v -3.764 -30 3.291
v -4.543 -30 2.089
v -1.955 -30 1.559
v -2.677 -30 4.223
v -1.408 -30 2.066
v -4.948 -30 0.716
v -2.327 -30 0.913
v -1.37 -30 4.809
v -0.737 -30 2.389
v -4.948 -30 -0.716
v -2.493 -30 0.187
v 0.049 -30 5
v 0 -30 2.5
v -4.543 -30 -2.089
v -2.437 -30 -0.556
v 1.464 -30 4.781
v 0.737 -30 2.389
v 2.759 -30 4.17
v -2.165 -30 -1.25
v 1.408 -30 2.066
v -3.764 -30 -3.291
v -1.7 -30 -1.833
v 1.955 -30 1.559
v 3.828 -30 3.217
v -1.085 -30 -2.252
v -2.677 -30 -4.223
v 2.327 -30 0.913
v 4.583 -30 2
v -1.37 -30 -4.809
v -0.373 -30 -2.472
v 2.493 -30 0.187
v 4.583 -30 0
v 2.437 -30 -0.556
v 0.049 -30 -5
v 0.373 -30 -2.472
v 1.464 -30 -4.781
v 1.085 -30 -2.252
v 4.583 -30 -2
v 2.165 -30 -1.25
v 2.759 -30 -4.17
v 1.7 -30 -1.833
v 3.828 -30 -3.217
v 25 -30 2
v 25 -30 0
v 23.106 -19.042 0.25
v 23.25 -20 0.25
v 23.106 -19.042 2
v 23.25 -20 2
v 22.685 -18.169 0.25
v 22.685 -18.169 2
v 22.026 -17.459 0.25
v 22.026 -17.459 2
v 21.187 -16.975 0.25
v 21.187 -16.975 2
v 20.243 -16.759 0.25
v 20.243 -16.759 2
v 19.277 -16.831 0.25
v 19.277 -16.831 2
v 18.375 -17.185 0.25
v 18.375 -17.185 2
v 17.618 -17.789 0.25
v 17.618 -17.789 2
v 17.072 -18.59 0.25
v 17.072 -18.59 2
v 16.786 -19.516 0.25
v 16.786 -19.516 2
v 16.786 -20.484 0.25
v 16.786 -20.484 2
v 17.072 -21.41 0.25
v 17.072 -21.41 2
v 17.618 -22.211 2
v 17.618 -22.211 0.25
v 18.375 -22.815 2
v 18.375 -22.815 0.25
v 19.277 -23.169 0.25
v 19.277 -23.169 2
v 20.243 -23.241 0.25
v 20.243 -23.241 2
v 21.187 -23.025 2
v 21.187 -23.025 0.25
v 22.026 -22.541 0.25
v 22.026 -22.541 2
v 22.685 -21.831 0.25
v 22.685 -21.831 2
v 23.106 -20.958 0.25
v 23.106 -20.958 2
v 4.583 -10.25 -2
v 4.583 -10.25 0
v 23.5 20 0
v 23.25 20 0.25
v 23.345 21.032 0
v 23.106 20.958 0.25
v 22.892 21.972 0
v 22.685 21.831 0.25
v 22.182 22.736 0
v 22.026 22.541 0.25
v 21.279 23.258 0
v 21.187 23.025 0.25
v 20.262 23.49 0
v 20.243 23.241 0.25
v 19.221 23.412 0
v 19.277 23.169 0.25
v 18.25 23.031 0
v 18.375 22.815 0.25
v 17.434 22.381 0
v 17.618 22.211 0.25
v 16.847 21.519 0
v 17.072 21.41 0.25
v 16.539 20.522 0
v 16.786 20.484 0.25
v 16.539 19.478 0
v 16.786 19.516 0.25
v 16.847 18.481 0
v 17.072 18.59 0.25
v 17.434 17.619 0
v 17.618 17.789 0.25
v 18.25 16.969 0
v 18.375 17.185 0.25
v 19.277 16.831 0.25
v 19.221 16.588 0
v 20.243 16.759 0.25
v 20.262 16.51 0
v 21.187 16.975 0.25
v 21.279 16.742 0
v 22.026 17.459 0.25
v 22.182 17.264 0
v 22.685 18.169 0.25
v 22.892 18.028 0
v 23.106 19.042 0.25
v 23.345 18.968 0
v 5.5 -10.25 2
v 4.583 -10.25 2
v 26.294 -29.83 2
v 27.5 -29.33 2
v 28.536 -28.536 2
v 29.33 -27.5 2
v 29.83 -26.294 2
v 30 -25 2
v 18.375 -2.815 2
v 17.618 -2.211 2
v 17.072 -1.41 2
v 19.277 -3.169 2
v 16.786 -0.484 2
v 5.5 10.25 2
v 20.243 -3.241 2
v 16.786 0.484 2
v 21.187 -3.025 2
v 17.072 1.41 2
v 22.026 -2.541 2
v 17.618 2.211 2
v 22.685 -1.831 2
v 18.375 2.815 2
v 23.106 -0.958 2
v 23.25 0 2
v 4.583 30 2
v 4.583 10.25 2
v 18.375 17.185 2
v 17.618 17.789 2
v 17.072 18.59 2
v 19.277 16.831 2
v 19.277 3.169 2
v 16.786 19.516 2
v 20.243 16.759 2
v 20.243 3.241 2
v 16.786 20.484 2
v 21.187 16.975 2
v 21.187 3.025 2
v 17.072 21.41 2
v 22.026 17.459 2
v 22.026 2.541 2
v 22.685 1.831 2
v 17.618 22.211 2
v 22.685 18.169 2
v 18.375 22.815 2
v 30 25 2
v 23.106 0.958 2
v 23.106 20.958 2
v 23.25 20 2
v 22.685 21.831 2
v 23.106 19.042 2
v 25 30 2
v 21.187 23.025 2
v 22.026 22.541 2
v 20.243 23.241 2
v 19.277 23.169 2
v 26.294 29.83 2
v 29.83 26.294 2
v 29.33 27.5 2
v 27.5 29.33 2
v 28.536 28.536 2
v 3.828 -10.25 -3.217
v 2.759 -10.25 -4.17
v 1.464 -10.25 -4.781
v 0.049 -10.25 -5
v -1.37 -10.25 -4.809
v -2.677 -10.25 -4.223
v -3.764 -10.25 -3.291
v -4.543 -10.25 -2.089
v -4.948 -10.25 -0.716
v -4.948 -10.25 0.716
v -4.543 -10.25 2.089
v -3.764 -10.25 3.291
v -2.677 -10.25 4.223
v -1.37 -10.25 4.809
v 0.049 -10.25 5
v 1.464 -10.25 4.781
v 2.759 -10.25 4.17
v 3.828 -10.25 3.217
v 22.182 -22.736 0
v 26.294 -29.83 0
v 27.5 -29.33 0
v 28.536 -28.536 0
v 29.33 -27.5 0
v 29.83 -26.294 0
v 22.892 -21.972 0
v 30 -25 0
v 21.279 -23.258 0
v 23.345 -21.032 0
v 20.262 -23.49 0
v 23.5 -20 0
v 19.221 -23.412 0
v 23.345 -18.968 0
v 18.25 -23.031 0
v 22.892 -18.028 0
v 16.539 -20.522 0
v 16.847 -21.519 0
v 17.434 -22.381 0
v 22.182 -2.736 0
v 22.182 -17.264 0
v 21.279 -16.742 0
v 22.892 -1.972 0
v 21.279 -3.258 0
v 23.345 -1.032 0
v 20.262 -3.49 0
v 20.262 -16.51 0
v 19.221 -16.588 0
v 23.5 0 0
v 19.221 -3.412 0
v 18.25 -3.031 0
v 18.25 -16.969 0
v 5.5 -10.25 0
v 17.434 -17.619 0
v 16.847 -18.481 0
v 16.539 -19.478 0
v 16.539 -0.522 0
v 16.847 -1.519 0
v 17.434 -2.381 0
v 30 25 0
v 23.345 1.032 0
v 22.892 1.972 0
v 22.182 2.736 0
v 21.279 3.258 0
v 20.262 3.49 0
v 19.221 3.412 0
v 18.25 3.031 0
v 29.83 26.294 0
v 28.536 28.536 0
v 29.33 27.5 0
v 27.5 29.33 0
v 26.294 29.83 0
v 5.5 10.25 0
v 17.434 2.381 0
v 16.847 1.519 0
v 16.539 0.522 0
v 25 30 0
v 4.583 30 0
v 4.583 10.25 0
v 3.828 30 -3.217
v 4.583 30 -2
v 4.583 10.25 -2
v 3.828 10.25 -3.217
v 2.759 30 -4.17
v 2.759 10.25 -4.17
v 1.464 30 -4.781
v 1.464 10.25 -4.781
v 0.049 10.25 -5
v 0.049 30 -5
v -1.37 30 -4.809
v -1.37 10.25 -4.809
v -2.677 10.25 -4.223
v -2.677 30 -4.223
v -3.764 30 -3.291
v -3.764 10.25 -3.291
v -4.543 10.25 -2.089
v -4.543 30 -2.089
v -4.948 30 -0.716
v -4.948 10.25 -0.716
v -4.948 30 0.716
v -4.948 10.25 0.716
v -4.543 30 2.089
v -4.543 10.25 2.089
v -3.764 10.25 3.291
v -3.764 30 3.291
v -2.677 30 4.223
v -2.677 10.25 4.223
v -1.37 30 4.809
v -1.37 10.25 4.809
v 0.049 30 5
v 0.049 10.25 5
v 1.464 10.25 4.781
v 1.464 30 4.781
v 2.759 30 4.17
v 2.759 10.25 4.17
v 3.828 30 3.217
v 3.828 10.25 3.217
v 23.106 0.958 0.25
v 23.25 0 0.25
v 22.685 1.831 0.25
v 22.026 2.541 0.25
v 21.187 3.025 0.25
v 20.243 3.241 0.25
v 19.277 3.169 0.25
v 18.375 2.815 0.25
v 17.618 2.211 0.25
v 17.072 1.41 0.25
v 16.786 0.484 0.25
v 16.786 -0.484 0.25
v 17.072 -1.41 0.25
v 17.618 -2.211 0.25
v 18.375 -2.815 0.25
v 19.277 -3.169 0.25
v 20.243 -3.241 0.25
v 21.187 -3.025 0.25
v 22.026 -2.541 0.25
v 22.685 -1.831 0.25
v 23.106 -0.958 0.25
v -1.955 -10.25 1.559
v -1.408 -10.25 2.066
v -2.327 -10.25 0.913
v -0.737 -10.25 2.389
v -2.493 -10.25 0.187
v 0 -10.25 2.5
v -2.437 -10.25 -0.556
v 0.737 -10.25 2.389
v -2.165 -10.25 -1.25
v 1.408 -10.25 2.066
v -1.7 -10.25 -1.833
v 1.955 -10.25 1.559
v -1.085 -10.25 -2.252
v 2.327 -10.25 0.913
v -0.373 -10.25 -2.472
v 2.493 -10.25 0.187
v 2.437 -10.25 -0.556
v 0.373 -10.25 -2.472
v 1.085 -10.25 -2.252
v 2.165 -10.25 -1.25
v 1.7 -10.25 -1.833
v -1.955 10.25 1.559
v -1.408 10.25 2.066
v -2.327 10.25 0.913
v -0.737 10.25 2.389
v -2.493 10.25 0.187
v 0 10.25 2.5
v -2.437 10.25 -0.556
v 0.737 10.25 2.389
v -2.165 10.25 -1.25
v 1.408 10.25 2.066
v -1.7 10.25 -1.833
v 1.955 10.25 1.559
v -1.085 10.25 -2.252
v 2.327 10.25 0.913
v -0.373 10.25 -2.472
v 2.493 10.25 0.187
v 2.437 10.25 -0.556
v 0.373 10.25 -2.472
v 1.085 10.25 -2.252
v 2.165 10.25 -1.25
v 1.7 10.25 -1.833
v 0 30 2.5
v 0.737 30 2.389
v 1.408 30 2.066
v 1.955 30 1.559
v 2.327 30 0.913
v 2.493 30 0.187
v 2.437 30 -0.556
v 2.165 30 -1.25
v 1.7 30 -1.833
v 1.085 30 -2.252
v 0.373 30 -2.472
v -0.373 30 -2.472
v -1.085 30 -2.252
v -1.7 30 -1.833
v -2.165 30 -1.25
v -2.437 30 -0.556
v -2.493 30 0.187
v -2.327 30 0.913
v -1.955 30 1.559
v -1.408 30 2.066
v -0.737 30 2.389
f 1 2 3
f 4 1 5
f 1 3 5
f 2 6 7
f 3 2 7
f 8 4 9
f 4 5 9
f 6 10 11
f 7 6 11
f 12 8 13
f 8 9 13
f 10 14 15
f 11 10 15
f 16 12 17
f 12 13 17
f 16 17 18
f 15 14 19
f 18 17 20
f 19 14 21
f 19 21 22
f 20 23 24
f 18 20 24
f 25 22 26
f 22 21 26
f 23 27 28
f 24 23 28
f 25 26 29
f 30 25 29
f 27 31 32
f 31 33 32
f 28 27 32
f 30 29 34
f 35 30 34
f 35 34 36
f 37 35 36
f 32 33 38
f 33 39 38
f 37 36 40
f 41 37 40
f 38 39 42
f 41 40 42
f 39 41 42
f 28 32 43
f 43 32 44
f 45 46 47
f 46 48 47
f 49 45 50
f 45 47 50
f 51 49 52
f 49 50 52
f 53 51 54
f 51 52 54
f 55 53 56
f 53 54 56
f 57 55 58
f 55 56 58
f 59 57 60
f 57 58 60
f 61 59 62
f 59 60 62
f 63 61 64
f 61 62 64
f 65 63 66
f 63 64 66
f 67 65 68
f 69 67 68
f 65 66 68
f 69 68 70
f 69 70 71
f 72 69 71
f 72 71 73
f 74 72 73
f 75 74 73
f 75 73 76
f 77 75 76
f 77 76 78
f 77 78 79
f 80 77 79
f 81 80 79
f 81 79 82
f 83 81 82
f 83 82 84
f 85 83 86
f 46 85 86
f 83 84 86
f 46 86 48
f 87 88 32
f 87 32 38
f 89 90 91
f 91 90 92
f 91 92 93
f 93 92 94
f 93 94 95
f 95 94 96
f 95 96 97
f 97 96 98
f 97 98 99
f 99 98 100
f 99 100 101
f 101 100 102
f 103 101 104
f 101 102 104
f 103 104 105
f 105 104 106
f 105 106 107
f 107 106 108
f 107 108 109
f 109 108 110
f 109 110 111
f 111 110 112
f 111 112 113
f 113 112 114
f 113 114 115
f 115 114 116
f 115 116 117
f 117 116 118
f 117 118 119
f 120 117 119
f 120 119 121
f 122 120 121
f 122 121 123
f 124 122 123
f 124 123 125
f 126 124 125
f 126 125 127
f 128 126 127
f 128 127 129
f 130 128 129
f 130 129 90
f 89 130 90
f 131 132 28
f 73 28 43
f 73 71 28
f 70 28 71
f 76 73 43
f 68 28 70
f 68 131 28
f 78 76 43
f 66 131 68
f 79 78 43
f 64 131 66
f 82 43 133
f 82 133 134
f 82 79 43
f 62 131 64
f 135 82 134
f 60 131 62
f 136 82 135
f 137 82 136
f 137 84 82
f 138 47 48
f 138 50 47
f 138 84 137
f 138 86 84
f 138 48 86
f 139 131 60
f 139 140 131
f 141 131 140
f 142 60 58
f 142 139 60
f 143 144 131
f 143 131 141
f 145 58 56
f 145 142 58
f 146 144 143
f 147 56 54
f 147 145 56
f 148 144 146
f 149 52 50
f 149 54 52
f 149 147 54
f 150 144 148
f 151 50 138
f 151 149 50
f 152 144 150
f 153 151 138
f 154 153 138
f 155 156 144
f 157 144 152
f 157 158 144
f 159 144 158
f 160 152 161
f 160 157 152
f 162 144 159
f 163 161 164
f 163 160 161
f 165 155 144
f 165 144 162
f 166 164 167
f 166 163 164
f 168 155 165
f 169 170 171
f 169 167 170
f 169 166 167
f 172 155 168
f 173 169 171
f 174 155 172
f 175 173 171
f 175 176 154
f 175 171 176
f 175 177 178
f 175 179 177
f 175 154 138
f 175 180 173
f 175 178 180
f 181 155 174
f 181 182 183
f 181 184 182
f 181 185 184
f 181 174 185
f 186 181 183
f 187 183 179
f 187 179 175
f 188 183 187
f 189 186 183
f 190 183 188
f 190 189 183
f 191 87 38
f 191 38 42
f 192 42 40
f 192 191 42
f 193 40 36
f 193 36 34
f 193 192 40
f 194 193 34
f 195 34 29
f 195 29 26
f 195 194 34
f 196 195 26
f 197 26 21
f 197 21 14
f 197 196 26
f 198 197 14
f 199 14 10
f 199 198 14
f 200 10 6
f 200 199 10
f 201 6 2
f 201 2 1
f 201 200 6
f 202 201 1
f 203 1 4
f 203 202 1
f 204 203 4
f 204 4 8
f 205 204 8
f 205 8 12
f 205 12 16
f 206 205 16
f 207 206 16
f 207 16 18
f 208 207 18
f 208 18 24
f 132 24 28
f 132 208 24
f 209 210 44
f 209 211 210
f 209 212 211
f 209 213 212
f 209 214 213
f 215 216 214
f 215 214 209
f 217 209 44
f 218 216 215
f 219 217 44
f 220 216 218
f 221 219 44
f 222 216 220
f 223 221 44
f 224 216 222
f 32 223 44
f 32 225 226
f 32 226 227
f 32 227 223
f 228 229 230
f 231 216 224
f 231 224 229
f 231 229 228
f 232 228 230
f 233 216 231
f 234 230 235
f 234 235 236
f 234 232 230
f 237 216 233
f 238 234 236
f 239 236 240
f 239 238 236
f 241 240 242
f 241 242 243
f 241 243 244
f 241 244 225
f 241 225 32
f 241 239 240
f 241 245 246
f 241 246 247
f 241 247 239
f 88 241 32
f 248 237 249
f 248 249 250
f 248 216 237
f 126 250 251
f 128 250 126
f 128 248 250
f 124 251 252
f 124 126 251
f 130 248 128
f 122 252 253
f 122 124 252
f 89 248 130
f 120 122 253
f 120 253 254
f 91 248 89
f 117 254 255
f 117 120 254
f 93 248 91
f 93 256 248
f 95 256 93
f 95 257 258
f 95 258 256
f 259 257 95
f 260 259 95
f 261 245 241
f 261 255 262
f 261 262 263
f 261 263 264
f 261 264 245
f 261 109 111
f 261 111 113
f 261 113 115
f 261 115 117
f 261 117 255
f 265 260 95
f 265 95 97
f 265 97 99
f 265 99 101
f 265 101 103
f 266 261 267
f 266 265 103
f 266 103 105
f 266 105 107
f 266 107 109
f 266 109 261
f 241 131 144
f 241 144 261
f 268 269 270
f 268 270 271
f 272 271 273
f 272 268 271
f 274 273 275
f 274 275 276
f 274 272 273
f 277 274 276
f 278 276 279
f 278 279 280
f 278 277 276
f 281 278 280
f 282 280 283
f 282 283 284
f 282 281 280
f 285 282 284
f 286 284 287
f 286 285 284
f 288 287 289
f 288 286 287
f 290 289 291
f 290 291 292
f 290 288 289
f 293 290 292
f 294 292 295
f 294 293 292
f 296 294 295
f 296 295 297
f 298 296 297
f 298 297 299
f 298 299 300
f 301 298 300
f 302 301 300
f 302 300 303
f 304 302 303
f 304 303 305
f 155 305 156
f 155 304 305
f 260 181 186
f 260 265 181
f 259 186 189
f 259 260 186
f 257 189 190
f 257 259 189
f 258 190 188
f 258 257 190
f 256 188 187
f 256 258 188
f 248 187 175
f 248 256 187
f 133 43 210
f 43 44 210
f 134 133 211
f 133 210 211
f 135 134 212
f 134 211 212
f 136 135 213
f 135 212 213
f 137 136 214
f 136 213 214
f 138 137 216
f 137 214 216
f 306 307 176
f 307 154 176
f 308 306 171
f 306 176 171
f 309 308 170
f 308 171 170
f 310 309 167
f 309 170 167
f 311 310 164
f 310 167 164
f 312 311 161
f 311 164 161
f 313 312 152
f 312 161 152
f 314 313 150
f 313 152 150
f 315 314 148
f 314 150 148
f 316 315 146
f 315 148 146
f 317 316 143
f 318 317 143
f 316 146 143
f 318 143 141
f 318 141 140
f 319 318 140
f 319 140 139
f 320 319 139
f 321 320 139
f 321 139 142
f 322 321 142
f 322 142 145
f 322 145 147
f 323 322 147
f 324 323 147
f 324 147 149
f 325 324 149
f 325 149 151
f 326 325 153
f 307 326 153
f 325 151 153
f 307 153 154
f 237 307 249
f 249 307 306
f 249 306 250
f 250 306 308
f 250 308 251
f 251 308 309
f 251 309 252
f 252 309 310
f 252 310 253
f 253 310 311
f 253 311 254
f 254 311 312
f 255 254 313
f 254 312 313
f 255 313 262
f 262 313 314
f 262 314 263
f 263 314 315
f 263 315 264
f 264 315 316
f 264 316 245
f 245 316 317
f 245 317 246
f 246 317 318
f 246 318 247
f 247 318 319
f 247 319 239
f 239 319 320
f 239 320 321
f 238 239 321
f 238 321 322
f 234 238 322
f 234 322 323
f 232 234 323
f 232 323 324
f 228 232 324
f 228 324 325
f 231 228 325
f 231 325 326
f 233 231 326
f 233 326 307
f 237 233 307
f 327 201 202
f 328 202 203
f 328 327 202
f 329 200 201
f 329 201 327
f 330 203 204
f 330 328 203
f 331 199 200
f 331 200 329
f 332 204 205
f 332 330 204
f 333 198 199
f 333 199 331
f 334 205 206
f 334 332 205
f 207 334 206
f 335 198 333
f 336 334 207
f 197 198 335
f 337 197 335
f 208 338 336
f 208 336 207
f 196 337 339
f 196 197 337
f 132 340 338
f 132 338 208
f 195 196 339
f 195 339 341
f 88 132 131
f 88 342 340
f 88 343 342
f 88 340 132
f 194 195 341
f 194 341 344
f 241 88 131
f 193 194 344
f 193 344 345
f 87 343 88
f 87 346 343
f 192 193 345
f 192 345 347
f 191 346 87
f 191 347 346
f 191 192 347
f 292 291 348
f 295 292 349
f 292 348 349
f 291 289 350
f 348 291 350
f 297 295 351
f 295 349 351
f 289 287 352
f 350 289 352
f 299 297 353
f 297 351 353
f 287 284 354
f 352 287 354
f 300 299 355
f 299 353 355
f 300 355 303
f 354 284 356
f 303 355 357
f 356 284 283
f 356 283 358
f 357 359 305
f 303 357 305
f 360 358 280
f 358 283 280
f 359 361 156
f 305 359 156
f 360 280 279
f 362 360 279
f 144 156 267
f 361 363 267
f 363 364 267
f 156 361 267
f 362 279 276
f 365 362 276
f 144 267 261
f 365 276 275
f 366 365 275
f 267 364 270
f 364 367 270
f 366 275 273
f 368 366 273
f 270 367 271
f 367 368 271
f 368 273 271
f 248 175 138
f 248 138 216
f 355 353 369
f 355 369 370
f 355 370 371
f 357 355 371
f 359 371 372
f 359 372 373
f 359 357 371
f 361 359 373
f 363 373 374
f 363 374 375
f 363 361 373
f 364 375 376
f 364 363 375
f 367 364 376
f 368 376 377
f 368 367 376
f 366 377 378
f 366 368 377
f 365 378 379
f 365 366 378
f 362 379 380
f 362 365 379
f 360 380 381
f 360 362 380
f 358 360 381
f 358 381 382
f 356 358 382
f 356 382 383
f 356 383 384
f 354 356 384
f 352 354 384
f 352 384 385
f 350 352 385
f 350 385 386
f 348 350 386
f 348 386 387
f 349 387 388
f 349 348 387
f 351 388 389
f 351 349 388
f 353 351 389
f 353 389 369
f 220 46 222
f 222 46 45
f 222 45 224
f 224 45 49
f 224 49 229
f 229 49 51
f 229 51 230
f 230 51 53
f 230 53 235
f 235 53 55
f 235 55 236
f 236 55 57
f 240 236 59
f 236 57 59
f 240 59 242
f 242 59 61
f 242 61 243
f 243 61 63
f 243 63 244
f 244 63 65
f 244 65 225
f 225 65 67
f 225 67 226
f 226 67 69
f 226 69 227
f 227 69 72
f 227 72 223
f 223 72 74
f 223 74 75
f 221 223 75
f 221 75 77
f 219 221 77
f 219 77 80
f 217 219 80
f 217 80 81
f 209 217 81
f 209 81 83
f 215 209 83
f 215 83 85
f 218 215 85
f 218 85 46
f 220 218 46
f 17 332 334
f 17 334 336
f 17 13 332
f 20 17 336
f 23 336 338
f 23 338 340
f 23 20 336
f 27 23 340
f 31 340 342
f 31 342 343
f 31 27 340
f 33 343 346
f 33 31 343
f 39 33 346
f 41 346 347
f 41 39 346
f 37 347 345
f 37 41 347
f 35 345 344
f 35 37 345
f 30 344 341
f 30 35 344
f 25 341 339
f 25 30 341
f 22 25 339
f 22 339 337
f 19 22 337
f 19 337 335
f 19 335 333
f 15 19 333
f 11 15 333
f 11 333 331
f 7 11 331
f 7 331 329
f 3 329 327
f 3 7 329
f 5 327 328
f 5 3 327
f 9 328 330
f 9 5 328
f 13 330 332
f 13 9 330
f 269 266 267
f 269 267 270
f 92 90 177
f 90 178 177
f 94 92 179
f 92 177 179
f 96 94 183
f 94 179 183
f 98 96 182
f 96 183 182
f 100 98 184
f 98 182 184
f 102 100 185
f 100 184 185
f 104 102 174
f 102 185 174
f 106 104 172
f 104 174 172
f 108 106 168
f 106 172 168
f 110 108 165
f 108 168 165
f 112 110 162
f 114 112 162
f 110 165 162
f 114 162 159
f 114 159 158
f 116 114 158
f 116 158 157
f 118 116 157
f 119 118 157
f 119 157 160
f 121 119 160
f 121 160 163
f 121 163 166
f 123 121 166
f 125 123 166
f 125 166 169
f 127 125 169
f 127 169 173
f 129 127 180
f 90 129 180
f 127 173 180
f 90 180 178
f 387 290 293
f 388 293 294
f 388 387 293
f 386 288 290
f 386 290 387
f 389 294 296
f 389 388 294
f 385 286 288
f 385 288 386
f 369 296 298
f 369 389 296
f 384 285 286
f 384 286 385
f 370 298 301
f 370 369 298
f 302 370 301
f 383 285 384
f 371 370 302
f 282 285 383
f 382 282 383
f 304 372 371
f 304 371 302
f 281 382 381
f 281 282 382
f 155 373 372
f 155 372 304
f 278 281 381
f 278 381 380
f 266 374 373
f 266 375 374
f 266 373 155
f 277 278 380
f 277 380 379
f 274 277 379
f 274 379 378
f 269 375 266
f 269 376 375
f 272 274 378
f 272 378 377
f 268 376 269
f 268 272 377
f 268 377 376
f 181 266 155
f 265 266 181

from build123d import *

# Parameters (mm, degrees)
SKETCH1_R                            = 2.5
BOSS_EXTRUDE1_DEPTH                  = 30
SKETCH1_3_R                          = 2.5
CUT_EXTRUDE1_DEPTH                   = 10.25
F_6_5_6_5_DIAMETER_HOLE1_D           = 6.5
F_6_5_6_5_DIAMETER_HOLE1_CSINK_D     = 7
F_6_5_6_5_DIAMETER_HOLE1_CSINK_ANGLE = 90
FILLET1_R                            = 5


with BuildPart() as part:
    # Sketch1 → Boss-Extrude1 (new, symmetric)
    with BuildSketch(Plane(origin=(0, 0, 0), x_dir=(1, 0, 0), z_dir=(0, 1, 0))):
        with BuildLine():
            Line((4.582575695, 0), (4.582575695, 2))
            ThreePointArc((4.582575695, 2), (-5, 0), (4.582575695, -2))
            Line((4.582575695, -2), (30, -2))
            Line((30, -2), (30, 0))
            Line((30, 0), (4.582575695, 0))
        make_face()
        Circle(SKETCH1_R, mode=Mode.SUBTRACT)
    extrude(amount=BOSS_EXTRUDE1_DEPTH, both=True)

    # Sketch1<3> → Cut-Extrude1 (cut, symmetric)
    with BuildSketch(Plane(origin=(0, 0, 0), x_dir=(1, 0, 0), z_dir=(0, 1, 0))):
        with BuildLine():
            Line((4.582575695, -2), (5.5, -2))
            Line((5.5, -2), (5.5, 0))
            Line((5.5, 0), (4.582575695, 0))
            Line((4.582575695, 0), (4.582575695, 2))
            ThreePointArc((4.582575695, 2), (-5, 0), (4.582575695, -2))
        make_face()
        Circle(SKETCH1_3_R, mode=Mode.SUBTRACT)
    extrude(amount=CUT_EXTRUDE1_DEPTH, both=True, mode=Mode.SUBTRACT)

    # Ø6.5 (6.5) Diameter Hole1 (through all)
    with Locations(Plane(origin=(0, 0, 0), x_dir=(-1, 0, 0), z_dir=(0, 0, -1))):
        with Locations((-20, -20), (-20, 0), (-20, 20)):
            CounterSinkHole(F_6_5_6_5_DIAMETER_HOLE1_D / 2, F_6_5_6_5_DIAMETER_HOLE1_CSINK_D / 2, counter_sink_angle=F_6_5_6_5_DIAMETER_HOLE1_CSINK_ANGLE)

    # Fillet1
    fillet1_edges = [part.edges().sort_by_distance(p)[0] for p in [
        (30, 30, 1),
        (30, -30, 1),
    ]]
    fillet(fillet1_edges, radius=FILLET1_R)


solid = part.part
